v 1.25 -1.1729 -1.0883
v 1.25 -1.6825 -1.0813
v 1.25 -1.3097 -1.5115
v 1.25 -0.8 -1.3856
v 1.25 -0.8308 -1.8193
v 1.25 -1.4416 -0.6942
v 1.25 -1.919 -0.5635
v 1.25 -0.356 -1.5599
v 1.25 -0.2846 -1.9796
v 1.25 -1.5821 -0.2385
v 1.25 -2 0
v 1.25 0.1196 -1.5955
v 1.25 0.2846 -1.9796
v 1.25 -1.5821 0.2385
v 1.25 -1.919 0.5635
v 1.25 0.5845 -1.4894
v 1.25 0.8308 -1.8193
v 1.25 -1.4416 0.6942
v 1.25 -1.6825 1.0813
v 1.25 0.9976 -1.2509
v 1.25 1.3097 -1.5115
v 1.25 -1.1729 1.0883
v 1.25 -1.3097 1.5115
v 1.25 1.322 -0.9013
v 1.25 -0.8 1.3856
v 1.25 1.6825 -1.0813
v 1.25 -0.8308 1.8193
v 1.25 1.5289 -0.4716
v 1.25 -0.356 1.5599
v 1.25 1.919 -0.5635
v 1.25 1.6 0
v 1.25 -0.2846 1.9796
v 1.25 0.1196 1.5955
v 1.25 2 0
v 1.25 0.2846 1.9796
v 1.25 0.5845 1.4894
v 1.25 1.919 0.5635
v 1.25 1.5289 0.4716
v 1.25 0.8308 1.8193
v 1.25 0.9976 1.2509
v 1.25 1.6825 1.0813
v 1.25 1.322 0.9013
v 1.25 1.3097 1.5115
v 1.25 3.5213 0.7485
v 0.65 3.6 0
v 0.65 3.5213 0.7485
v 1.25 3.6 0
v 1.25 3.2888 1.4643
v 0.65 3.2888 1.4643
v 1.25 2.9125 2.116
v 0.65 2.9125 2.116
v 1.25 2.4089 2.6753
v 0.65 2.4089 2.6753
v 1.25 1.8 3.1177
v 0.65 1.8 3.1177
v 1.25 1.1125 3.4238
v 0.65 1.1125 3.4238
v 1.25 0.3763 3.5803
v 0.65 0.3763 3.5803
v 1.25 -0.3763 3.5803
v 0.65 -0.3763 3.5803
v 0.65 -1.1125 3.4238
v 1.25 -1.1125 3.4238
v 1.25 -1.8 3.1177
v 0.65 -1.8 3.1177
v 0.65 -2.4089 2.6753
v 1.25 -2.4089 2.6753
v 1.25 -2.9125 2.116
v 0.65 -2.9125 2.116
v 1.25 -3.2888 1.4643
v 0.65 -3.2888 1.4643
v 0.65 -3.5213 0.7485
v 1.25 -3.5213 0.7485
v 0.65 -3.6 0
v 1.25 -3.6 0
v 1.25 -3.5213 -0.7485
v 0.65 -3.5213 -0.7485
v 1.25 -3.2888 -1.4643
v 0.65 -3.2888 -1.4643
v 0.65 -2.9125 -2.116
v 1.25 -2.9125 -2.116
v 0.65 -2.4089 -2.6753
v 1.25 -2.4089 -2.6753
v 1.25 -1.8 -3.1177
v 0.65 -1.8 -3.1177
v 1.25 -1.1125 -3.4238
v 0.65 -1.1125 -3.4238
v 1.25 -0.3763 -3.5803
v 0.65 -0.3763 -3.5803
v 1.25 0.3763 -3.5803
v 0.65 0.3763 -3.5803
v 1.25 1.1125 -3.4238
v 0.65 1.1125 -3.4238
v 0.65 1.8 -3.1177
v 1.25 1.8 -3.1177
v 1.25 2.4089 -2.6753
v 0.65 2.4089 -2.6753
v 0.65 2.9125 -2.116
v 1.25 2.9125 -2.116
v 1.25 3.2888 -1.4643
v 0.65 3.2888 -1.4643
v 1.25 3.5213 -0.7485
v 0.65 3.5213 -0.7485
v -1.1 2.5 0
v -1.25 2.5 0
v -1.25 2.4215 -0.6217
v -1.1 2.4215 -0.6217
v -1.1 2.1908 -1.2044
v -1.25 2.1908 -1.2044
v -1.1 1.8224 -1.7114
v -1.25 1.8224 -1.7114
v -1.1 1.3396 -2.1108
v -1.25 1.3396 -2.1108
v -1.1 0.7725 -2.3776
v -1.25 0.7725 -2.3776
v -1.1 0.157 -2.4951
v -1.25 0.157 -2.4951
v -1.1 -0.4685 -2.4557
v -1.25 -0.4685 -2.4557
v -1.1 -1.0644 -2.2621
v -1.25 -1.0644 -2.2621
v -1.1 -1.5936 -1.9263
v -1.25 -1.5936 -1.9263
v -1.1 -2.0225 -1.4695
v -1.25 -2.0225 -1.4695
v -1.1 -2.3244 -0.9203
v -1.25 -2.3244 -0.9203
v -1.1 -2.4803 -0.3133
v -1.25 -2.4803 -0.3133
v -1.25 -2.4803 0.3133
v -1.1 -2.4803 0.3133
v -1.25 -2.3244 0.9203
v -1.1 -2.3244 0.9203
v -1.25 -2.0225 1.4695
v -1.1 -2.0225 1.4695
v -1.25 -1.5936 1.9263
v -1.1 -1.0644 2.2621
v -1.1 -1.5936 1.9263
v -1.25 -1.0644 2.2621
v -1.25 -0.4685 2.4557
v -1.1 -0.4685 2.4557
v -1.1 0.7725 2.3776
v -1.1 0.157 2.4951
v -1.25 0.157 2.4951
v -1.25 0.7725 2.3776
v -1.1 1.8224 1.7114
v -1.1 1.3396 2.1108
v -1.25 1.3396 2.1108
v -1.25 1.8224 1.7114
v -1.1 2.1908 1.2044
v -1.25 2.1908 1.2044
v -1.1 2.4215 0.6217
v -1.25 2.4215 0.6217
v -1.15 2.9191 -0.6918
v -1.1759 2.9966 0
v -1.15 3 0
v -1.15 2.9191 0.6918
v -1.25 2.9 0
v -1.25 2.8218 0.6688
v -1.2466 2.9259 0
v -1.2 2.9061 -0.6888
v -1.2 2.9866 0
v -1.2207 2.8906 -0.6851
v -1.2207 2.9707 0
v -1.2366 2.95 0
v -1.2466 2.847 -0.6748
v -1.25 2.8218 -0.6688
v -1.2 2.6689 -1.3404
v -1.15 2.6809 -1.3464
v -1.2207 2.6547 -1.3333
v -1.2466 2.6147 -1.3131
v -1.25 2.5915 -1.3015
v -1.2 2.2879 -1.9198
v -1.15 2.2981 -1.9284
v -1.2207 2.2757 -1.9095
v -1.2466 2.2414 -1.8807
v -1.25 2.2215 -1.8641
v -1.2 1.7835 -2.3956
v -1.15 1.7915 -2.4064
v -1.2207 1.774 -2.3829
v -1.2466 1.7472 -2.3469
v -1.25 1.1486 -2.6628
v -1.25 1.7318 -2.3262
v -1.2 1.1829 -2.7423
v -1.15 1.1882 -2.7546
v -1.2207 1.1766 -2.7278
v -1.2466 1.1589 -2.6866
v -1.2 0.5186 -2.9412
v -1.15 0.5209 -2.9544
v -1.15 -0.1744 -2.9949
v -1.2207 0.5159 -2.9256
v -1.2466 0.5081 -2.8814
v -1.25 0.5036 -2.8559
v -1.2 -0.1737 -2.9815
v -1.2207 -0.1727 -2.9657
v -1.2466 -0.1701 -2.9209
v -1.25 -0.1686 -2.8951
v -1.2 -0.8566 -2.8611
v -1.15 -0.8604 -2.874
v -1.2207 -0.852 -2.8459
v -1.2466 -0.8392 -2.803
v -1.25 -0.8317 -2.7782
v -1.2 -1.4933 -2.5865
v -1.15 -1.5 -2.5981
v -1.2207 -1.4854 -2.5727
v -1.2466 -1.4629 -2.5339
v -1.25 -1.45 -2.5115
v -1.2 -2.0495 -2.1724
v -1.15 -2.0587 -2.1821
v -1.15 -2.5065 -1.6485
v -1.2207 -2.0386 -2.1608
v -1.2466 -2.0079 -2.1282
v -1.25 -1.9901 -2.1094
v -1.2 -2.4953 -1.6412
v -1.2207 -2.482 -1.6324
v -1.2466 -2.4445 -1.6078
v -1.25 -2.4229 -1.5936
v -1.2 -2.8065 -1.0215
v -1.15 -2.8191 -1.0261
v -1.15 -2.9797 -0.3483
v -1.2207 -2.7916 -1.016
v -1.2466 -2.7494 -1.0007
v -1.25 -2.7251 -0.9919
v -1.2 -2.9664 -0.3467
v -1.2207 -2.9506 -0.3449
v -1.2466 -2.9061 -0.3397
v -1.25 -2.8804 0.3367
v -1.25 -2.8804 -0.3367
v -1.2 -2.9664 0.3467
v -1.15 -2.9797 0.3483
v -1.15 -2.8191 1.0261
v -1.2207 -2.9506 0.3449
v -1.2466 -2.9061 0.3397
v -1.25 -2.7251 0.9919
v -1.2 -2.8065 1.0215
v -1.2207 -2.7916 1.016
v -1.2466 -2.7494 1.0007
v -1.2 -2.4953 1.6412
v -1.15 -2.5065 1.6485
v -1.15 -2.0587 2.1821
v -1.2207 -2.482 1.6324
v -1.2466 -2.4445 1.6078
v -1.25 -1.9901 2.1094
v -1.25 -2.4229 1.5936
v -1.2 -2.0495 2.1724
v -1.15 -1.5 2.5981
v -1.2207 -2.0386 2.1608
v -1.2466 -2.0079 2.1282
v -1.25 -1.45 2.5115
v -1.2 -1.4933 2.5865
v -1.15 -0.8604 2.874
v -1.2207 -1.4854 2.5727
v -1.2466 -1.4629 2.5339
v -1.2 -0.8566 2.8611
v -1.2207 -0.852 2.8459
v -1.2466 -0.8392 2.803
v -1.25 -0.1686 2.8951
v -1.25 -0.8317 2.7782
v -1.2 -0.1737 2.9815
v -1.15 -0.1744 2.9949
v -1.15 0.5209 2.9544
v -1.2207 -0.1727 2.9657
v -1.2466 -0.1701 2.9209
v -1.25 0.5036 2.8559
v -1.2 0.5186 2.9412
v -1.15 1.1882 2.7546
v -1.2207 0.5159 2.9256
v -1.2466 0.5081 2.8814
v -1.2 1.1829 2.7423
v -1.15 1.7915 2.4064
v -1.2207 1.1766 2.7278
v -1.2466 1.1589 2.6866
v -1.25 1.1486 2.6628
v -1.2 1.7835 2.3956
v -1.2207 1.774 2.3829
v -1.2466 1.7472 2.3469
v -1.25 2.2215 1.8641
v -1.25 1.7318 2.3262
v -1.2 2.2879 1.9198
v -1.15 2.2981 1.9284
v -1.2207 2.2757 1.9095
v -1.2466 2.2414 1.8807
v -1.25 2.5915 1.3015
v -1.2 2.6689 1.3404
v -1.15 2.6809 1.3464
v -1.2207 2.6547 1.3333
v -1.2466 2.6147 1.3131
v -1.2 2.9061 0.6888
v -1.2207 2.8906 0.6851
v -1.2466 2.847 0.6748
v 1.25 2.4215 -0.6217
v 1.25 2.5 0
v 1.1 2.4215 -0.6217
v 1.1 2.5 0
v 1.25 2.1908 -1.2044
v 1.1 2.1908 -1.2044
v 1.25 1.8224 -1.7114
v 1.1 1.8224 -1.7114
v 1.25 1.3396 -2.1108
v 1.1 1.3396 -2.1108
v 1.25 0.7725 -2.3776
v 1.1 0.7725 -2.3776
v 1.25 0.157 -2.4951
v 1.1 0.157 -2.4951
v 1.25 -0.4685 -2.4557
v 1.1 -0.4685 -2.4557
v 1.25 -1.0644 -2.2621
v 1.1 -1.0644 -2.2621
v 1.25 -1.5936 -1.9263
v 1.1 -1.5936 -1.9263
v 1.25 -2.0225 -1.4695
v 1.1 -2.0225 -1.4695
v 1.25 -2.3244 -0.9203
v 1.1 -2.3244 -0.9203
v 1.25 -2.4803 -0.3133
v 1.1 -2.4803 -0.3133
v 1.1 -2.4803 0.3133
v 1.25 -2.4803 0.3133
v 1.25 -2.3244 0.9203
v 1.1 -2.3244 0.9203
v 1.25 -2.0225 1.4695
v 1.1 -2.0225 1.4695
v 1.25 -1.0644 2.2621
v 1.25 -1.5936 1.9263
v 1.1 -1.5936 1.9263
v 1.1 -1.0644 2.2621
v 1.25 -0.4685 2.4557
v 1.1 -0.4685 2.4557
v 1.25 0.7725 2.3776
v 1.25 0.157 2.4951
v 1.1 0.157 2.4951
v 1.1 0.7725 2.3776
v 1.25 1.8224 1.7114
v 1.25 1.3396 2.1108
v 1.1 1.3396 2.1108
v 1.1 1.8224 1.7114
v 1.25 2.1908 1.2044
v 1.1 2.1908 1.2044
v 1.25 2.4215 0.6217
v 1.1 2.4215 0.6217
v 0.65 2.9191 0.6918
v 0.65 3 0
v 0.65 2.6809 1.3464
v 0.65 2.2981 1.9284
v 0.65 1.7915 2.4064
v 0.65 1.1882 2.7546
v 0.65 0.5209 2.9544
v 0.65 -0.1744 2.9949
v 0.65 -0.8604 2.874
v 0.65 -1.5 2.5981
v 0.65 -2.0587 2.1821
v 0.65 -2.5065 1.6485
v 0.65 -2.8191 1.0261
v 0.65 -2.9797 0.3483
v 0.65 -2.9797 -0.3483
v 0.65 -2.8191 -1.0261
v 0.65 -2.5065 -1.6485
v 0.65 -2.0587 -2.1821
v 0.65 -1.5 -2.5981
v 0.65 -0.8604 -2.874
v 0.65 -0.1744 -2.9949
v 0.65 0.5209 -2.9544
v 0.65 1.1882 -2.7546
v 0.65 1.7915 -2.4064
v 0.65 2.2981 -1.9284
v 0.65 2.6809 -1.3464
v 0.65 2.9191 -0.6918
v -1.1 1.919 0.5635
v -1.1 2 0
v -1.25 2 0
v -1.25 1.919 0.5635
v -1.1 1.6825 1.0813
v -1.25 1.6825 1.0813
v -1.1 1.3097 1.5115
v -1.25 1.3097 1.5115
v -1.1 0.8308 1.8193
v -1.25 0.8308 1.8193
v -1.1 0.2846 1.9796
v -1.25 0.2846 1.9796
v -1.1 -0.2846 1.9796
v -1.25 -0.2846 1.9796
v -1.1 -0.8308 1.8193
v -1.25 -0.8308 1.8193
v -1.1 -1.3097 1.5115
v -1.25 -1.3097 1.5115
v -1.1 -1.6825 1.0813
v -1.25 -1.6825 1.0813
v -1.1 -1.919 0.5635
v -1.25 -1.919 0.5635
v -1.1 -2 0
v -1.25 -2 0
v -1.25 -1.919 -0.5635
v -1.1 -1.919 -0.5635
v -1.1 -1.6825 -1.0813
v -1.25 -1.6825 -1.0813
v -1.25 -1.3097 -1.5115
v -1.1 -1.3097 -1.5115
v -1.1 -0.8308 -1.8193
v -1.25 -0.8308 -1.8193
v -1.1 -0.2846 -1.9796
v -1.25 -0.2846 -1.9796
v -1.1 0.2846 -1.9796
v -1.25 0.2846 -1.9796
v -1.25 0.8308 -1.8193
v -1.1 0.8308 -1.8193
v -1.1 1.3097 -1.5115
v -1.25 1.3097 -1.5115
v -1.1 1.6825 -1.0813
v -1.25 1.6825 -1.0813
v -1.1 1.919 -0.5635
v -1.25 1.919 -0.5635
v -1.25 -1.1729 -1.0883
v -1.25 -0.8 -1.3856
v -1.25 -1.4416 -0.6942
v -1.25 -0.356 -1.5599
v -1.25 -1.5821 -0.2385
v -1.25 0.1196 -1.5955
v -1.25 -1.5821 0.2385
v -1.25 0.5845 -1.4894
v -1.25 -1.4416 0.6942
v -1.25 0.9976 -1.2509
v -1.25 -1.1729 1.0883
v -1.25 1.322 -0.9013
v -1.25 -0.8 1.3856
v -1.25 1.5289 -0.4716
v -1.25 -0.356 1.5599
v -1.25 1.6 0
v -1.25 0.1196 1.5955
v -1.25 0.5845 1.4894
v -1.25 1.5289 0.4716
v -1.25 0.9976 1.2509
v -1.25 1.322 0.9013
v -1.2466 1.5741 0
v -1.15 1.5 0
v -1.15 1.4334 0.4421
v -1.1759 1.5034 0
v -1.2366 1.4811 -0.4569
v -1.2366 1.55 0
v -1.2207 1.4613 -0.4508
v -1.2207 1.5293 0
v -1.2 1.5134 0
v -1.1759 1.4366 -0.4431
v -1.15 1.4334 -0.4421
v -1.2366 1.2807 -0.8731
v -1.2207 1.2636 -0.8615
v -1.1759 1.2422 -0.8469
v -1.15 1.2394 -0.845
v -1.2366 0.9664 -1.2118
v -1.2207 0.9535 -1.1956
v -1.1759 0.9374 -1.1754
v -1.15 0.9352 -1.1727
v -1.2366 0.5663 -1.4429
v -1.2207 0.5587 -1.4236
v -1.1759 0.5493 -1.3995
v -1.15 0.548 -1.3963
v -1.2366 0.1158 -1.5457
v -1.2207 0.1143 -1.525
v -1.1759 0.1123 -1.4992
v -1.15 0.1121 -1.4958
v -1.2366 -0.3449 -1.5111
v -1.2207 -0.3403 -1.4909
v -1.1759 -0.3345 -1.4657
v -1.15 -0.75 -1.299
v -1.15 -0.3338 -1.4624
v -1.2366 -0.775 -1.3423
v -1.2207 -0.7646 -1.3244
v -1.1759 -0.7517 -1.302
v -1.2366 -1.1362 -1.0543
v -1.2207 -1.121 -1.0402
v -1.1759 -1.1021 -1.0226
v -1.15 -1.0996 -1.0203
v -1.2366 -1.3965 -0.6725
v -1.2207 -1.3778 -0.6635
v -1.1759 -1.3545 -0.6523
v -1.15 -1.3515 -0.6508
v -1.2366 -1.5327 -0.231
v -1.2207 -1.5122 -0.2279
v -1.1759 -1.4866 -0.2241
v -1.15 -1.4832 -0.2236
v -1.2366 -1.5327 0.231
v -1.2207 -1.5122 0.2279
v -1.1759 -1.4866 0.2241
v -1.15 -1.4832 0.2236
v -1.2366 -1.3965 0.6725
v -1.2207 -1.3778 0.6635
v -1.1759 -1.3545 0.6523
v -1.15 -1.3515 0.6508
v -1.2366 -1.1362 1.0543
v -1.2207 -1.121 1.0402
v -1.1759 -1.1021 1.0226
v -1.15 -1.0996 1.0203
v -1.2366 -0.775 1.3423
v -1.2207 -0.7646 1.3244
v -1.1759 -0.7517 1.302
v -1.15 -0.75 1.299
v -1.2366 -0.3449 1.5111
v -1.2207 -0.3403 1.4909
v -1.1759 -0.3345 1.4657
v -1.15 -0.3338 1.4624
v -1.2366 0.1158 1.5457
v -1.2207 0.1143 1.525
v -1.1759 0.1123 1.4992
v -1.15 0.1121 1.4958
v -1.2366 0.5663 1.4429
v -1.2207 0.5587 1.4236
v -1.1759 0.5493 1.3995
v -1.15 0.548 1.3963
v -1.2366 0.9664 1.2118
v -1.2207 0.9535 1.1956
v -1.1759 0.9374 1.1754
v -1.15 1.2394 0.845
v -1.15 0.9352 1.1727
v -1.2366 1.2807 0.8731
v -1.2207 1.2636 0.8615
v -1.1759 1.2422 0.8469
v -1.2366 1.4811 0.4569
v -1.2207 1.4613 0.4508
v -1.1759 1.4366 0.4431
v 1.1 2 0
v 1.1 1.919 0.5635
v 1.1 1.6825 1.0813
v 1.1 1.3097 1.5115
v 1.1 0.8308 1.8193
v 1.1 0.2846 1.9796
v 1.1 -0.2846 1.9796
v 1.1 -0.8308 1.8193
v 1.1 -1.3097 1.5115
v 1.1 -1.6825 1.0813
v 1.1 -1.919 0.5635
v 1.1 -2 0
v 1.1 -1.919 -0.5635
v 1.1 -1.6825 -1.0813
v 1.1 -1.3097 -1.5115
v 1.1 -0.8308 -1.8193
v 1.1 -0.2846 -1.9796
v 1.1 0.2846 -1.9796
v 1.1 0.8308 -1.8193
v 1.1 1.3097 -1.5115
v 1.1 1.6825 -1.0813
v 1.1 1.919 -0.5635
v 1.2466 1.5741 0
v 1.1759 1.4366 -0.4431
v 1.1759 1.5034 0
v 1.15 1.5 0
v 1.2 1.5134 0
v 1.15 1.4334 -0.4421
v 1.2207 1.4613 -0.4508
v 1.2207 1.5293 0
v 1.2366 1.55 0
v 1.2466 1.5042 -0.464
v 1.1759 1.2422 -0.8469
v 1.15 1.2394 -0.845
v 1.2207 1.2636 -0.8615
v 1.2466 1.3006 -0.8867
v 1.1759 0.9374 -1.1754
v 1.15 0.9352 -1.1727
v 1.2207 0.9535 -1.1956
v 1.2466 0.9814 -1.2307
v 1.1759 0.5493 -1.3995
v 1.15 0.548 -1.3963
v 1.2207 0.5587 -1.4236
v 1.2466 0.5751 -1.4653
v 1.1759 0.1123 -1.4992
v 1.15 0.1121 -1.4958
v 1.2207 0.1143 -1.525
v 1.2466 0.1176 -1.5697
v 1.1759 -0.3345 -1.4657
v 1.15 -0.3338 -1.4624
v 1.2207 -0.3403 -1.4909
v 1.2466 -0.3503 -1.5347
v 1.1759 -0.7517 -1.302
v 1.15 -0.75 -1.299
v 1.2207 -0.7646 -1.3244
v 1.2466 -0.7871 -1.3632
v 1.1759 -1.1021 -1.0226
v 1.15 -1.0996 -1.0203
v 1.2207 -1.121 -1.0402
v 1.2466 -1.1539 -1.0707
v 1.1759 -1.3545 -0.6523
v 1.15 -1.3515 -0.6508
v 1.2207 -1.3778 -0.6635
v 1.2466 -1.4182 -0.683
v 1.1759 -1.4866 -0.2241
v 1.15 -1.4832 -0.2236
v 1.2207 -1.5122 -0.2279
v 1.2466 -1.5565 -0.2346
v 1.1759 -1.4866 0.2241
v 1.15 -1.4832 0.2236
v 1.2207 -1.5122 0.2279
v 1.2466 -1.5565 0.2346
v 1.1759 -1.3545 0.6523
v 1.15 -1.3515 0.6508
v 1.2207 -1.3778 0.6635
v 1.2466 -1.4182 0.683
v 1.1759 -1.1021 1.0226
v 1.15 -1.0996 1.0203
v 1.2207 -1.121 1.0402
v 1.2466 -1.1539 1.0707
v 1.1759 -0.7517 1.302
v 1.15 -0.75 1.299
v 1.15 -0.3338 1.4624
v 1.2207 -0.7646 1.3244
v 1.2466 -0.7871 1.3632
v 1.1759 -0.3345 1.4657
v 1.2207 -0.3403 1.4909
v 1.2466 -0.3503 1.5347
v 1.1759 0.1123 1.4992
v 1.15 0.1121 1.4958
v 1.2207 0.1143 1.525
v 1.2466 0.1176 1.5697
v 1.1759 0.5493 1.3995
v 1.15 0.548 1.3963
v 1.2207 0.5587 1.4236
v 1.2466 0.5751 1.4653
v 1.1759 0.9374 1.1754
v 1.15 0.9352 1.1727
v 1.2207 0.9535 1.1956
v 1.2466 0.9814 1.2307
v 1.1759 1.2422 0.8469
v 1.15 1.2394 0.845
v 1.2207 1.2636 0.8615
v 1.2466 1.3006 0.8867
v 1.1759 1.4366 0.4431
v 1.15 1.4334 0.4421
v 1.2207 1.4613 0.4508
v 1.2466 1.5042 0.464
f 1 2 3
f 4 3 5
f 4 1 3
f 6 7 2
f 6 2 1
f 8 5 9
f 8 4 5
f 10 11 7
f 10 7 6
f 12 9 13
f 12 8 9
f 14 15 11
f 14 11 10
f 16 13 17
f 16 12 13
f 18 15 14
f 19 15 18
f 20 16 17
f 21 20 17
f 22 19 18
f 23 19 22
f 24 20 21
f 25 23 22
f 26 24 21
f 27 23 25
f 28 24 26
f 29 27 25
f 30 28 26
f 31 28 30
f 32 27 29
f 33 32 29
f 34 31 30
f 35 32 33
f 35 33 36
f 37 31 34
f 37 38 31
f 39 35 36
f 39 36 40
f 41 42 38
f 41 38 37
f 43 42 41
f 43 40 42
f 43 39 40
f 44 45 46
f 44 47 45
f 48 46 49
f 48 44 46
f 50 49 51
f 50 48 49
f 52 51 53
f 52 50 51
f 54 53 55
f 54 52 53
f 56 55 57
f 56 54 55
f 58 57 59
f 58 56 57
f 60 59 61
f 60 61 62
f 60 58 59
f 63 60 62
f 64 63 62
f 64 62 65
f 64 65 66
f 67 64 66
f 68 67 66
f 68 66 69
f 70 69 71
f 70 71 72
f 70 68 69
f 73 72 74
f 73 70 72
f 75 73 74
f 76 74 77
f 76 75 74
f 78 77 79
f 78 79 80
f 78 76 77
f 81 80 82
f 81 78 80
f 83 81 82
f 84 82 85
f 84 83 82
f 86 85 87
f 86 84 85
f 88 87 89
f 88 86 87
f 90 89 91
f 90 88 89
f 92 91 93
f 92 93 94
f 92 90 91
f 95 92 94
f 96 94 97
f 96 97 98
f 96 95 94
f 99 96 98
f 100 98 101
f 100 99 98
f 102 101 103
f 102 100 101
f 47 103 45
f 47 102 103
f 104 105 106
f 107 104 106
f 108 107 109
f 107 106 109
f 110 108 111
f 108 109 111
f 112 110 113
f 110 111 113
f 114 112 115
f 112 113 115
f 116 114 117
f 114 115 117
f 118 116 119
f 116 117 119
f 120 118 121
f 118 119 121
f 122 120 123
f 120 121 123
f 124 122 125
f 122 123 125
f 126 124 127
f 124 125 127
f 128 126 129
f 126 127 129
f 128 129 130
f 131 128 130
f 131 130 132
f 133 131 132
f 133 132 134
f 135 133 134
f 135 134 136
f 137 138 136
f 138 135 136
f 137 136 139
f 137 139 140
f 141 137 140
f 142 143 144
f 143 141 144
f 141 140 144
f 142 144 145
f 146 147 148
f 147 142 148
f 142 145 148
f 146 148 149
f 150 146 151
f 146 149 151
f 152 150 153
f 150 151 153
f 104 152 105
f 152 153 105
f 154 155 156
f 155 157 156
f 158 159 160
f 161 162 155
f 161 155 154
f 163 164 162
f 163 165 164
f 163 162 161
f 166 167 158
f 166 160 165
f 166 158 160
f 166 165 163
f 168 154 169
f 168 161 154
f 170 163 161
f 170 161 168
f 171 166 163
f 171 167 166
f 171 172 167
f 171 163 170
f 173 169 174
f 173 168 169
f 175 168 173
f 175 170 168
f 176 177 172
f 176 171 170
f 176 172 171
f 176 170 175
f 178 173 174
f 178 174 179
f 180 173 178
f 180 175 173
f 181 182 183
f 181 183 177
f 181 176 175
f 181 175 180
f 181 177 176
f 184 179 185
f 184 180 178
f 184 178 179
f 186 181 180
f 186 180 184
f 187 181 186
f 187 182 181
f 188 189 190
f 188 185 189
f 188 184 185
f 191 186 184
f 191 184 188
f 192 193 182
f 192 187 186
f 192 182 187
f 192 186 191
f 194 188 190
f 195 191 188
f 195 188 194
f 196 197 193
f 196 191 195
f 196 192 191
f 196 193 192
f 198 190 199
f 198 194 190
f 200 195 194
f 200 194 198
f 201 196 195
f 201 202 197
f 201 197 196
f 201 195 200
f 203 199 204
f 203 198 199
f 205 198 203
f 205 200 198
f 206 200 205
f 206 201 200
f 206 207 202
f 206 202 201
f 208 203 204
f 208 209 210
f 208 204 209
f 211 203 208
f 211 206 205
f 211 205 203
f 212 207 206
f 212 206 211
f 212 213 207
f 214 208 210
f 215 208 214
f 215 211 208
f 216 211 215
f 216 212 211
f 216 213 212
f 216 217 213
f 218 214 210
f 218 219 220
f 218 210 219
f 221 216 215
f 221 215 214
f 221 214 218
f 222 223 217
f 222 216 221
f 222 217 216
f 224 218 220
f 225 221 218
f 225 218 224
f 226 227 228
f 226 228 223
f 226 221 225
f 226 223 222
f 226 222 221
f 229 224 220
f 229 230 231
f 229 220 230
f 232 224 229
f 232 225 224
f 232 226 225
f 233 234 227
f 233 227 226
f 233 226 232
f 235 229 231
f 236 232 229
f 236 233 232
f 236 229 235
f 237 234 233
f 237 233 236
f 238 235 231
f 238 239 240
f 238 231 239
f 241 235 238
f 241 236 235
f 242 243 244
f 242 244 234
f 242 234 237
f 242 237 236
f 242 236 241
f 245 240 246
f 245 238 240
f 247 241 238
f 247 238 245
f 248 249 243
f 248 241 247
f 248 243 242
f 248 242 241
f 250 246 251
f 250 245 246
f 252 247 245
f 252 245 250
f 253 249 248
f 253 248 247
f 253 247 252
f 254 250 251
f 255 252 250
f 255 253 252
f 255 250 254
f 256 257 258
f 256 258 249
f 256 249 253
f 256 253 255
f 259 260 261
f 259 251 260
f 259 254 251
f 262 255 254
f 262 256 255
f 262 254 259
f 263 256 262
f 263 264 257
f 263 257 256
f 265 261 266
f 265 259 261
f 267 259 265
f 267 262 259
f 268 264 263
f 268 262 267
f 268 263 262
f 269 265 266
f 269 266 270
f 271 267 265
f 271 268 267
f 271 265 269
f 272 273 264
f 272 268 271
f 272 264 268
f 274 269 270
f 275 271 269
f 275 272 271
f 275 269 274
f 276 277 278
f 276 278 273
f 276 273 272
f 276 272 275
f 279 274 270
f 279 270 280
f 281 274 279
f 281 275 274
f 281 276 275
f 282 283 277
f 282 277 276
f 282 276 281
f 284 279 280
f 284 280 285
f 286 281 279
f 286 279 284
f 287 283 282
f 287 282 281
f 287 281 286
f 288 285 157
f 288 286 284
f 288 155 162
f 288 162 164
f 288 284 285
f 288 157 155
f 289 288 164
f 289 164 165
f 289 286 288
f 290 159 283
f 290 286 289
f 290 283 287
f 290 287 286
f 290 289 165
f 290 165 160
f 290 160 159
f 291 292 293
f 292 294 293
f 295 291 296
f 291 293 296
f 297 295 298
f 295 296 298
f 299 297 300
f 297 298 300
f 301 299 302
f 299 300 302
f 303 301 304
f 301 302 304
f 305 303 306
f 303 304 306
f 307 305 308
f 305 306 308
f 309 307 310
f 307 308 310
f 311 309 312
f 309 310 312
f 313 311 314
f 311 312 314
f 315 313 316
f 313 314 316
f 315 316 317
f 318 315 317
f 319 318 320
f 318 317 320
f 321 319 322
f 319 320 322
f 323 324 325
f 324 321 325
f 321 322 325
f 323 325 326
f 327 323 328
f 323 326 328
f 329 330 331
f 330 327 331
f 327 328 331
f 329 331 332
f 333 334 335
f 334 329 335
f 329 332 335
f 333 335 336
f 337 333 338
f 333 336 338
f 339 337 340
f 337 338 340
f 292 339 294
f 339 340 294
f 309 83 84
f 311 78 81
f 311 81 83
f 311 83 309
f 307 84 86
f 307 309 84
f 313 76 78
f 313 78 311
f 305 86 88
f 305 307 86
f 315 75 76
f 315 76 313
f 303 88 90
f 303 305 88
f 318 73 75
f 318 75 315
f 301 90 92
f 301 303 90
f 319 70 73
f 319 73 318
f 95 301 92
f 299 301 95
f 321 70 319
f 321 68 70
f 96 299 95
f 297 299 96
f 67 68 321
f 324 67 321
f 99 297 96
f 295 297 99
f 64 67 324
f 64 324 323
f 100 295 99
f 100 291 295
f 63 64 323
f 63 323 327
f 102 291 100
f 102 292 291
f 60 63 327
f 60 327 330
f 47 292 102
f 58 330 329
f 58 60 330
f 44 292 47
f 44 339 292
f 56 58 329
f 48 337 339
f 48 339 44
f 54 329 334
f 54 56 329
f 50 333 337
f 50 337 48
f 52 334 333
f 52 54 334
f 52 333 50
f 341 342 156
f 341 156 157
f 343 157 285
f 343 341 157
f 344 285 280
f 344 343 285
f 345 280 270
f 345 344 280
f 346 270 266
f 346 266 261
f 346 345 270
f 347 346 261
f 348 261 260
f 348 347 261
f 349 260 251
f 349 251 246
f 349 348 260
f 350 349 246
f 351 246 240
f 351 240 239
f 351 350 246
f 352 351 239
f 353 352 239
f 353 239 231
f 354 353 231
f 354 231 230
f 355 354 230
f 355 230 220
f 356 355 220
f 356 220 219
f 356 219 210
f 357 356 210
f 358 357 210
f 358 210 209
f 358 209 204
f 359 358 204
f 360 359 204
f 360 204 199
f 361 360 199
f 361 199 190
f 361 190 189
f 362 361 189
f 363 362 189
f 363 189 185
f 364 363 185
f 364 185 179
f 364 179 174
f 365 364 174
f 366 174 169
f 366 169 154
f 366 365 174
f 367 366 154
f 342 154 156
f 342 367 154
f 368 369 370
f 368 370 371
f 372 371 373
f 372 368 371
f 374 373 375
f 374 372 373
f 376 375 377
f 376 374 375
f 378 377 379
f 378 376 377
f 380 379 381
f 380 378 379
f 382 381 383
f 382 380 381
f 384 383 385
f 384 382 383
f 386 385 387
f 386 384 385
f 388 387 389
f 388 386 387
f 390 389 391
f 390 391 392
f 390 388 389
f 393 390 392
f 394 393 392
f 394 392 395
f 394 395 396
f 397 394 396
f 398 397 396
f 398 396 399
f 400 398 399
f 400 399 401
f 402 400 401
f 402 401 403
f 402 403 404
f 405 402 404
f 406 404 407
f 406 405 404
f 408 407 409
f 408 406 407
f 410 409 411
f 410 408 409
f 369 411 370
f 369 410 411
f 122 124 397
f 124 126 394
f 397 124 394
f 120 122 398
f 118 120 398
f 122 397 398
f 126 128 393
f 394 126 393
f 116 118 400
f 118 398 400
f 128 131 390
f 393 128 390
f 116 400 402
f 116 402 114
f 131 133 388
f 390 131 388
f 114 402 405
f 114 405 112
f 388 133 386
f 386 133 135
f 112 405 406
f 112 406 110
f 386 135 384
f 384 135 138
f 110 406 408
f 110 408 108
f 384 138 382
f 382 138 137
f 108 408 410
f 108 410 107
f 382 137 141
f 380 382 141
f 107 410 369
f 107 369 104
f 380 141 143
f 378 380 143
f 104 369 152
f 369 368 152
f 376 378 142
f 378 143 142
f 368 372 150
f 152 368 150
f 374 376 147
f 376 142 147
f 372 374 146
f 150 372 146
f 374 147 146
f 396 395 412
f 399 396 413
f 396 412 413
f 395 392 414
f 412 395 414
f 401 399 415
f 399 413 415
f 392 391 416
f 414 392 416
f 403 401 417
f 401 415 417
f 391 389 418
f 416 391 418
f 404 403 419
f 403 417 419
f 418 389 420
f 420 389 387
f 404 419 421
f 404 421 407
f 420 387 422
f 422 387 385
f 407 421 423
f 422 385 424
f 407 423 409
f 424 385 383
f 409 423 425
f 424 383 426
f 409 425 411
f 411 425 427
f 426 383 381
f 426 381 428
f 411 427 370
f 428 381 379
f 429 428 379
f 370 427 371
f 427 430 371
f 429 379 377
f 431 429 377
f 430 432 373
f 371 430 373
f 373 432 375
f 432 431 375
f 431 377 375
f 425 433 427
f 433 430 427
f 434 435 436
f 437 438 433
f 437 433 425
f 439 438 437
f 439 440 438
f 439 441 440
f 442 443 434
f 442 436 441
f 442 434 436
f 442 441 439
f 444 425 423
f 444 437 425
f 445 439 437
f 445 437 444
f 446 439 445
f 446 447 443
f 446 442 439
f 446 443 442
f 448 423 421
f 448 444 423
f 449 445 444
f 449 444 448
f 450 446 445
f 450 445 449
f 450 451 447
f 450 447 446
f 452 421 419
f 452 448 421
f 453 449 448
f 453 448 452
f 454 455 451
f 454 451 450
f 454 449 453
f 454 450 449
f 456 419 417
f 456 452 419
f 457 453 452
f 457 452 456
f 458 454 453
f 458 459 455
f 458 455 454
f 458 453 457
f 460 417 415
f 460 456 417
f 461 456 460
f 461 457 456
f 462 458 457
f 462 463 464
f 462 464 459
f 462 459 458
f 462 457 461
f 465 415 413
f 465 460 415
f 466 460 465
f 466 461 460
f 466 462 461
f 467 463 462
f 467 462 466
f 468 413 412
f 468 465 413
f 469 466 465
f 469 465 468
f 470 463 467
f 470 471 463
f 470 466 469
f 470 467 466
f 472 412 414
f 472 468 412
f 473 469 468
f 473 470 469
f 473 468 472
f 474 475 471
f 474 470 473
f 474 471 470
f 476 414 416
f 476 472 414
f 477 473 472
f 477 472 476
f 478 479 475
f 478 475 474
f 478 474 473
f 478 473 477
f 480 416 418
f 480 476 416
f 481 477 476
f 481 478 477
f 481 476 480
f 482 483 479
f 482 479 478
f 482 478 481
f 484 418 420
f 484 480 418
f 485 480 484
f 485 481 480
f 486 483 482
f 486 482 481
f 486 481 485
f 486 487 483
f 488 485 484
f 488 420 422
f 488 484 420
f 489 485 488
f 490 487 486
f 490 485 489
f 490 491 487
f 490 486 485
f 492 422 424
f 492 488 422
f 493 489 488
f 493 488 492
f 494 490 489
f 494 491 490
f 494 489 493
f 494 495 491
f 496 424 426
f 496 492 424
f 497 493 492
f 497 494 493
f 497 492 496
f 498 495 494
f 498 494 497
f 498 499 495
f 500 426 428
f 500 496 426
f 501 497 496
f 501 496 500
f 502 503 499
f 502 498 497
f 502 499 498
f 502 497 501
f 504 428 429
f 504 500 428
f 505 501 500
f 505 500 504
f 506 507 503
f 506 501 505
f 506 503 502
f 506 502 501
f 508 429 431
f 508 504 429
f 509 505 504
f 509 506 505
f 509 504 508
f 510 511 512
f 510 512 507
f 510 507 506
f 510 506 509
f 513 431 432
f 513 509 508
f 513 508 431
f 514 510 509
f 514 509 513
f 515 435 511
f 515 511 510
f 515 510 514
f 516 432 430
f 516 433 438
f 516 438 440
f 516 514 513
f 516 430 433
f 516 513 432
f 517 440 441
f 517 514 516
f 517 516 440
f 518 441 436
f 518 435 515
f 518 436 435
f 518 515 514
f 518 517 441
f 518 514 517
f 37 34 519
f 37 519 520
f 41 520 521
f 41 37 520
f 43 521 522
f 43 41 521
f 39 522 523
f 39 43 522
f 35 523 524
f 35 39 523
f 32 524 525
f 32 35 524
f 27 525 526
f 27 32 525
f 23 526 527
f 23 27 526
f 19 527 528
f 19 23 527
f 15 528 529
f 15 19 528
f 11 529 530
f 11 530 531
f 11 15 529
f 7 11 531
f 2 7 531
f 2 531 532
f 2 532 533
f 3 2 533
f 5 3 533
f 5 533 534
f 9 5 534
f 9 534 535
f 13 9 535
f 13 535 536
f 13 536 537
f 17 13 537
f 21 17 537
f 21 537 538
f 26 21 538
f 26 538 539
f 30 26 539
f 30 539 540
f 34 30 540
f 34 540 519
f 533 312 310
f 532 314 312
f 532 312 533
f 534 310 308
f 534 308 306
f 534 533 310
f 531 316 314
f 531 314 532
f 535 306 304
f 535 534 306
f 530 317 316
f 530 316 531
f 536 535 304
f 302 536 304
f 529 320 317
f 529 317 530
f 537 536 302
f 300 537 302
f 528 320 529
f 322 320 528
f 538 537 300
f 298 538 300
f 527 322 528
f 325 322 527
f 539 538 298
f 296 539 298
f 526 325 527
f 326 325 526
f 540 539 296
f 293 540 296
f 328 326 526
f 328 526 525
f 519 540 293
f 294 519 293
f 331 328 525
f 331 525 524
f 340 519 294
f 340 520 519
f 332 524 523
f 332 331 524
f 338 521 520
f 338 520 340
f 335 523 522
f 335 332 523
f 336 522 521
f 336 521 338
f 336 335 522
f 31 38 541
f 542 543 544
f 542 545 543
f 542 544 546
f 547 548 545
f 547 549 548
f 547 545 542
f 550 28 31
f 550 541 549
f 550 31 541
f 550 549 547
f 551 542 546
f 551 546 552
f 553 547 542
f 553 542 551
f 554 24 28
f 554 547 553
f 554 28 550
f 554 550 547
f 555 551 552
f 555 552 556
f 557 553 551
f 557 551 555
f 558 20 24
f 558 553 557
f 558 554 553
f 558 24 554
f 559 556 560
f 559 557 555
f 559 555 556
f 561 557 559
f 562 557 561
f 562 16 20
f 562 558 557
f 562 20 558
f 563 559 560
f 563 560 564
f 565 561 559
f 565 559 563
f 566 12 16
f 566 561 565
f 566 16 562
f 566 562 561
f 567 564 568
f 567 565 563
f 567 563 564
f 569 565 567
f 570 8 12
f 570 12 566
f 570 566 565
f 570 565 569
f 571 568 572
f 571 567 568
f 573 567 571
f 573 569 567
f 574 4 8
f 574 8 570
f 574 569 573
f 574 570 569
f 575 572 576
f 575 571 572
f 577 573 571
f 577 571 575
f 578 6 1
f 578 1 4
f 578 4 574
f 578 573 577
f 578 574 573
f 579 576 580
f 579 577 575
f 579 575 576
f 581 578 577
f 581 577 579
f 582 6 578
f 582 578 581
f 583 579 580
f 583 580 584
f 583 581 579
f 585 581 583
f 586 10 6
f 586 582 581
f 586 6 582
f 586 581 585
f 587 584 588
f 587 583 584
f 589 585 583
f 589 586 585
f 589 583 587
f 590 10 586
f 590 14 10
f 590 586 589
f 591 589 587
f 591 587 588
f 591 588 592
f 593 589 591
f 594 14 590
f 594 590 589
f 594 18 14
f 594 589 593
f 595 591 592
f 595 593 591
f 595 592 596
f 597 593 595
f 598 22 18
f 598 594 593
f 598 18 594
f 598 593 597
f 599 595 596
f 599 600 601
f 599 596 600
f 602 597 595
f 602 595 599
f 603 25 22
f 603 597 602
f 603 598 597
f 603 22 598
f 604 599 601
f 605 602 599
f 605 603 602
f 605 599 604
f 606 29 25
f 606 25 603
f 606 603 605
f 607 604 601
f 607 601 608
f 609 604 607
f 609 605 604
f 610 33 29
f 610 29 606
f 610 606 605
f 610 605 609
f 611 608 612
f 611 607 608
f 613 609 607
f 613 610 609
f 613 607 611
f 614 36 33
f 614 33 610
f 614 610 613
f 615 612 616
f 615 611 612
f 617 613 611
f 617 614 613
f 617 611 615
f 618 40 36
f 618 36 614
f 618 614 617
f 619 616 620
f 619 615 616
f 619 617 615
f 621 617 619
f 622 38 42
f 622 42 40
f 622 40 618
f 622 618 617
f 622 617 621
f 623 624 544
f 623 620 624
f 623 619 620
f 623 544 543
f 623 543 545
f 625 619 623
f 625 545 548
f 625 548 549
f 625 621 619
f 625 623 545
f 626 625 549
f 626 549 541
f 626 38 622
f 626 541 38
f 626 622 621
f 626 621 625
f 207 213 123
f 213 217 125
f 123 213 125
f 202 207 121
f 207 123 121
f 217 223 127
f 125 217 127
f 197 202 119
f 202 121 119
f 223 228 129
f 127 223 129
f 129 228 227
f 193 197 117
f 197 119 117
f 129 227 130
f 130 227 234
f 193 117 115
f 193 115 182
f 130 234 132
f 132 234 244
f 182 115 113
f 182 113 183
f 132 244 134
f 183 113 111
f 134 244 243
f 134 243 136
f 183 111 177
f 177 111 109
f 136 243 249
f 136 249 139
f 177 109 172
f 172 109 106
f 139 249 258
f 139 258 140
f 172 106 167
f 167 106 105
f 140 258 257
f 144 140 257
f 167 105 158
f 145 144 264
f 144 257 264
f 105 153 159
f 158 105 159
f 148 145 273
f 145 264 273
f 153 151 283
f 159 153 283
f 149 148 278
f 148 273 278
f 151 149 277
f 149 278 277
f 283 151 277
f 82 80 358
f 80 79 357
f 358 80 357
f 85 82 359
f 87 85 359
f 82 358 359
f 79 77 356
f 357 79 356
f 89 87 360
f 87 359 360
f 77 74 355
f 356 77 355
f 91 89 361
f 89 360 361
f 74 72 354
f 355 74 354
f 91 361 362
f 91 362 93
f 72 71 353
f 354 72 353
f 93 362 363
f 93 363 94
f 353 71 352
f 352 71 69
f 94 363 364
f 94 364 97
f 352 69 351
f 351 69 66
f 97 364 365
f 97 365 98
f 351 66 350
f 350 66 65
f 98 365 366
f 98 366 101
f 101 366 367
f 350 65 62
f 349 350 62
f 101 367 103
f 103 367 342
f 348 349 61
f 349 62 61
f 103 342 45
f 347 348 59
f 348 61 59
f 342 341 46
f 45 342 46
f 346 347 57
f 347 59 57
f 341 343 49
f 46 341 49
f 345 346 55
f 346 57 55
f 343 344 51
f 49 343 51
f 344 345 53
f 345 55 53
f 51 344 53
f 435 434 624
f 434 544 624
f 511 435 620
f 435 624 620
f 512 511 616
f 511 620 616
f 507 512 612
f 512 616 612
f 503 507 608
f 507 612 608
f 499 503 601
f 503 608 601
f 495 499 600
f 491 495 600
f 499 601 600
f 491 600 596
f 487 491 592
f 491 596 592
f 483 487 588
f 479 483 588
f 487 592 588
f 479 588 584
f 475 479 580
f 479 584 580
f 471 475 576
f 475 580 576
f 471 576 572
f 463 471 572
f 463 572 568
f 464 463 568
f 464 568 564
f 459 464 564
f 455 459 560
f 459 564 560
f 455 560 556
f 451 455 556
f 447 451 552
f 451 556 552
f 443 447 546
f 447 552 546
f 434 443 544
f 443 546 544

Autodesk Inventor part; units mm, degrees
ref_plane "YZ Plane" through (0, 0, 0) normal (1, 0, 0) x (0, 1, 0)
ref_plane "XZ Plane" through (0, 0, 0) normal (0, 1, 0) x (-1, 0, 0)
ref_plane "XY Plane" through (0, 0, 0) normal (0, 0, 1) x (1, 0, 0)
sketch "_____1" plane through (0, 0, 0) normal (0, 0, 1) x (1, 0, 0)
  line L0 (50, 0) -> (-50, 0)
  line L1 (-1.25, 0) -> (-1.25, 2)
  line L2 (-1.25, 2) -> (-1.1, 2)
  line L3 (-1.1, 2) -> (-1.1, 2.5)
  line L4 (-1.1, 2.5) -> (-1.25, 2.5)
  line L5 (-1.25, 2.5) -> (-1.25, 2.9)
  arc A0 (-1.15, 3) -> (-1.25, 2.9) centre (-1.15, 2.9) ccw
  line L6 (-1.15, 3) -> (0.65, 3)
  line L7 (0.65, 3) -> (0.65, 3.6)
  line L8 (0.65, 3.6) -> (1.25, 3.6)
  line L9 (1.25, 3.6) -> (1.25, 2.5)
  line L10 (1.25, 2.5) -> (1.1, 2.5)
  line L11 (1.1, 2.5) -> (1.1, 2)
  line L12 (1.1, 2) -> (1.25, 2)
  line L13 (1.25, 2) -> (1.25, 0)
  line L14 (1.25, 0) -> (-1.25, 0)
revolve "Revolution1" add sketch "_____1" angle 360 about axis through (50, 0, 0) along (1, 0, 0)
sketch "_____2" plane through (0, 0, 0) normal (0, 0, 1) x (1, 0, 0)
  line L0 (50, 0) -> (-50, 0)
  line L1 (-1.25, 0) -> (-1.25, 1.6)
  arc A0 (-1.25, 1.6) -> (-1.15, 1.5) centre (-1.15, 1.6) ccw
  line L2 (-1.15, 1.5) -> (1.15, 1.5)
  arc A1 (1.15, 1.5) -> (1.25, 1.6) centre (1.15, 1.6) ccw
  line L3 (1.25, 1.6) -> (1.25, 0)
  line L4 (1.25, 0) -> (-1.25, 0)
revolve "Revolution2" cut sketch "_____2" angle 360 about axis through (50, 0, 0) along (1, 0, 0)
properties part number "C-FL673ZZ"
